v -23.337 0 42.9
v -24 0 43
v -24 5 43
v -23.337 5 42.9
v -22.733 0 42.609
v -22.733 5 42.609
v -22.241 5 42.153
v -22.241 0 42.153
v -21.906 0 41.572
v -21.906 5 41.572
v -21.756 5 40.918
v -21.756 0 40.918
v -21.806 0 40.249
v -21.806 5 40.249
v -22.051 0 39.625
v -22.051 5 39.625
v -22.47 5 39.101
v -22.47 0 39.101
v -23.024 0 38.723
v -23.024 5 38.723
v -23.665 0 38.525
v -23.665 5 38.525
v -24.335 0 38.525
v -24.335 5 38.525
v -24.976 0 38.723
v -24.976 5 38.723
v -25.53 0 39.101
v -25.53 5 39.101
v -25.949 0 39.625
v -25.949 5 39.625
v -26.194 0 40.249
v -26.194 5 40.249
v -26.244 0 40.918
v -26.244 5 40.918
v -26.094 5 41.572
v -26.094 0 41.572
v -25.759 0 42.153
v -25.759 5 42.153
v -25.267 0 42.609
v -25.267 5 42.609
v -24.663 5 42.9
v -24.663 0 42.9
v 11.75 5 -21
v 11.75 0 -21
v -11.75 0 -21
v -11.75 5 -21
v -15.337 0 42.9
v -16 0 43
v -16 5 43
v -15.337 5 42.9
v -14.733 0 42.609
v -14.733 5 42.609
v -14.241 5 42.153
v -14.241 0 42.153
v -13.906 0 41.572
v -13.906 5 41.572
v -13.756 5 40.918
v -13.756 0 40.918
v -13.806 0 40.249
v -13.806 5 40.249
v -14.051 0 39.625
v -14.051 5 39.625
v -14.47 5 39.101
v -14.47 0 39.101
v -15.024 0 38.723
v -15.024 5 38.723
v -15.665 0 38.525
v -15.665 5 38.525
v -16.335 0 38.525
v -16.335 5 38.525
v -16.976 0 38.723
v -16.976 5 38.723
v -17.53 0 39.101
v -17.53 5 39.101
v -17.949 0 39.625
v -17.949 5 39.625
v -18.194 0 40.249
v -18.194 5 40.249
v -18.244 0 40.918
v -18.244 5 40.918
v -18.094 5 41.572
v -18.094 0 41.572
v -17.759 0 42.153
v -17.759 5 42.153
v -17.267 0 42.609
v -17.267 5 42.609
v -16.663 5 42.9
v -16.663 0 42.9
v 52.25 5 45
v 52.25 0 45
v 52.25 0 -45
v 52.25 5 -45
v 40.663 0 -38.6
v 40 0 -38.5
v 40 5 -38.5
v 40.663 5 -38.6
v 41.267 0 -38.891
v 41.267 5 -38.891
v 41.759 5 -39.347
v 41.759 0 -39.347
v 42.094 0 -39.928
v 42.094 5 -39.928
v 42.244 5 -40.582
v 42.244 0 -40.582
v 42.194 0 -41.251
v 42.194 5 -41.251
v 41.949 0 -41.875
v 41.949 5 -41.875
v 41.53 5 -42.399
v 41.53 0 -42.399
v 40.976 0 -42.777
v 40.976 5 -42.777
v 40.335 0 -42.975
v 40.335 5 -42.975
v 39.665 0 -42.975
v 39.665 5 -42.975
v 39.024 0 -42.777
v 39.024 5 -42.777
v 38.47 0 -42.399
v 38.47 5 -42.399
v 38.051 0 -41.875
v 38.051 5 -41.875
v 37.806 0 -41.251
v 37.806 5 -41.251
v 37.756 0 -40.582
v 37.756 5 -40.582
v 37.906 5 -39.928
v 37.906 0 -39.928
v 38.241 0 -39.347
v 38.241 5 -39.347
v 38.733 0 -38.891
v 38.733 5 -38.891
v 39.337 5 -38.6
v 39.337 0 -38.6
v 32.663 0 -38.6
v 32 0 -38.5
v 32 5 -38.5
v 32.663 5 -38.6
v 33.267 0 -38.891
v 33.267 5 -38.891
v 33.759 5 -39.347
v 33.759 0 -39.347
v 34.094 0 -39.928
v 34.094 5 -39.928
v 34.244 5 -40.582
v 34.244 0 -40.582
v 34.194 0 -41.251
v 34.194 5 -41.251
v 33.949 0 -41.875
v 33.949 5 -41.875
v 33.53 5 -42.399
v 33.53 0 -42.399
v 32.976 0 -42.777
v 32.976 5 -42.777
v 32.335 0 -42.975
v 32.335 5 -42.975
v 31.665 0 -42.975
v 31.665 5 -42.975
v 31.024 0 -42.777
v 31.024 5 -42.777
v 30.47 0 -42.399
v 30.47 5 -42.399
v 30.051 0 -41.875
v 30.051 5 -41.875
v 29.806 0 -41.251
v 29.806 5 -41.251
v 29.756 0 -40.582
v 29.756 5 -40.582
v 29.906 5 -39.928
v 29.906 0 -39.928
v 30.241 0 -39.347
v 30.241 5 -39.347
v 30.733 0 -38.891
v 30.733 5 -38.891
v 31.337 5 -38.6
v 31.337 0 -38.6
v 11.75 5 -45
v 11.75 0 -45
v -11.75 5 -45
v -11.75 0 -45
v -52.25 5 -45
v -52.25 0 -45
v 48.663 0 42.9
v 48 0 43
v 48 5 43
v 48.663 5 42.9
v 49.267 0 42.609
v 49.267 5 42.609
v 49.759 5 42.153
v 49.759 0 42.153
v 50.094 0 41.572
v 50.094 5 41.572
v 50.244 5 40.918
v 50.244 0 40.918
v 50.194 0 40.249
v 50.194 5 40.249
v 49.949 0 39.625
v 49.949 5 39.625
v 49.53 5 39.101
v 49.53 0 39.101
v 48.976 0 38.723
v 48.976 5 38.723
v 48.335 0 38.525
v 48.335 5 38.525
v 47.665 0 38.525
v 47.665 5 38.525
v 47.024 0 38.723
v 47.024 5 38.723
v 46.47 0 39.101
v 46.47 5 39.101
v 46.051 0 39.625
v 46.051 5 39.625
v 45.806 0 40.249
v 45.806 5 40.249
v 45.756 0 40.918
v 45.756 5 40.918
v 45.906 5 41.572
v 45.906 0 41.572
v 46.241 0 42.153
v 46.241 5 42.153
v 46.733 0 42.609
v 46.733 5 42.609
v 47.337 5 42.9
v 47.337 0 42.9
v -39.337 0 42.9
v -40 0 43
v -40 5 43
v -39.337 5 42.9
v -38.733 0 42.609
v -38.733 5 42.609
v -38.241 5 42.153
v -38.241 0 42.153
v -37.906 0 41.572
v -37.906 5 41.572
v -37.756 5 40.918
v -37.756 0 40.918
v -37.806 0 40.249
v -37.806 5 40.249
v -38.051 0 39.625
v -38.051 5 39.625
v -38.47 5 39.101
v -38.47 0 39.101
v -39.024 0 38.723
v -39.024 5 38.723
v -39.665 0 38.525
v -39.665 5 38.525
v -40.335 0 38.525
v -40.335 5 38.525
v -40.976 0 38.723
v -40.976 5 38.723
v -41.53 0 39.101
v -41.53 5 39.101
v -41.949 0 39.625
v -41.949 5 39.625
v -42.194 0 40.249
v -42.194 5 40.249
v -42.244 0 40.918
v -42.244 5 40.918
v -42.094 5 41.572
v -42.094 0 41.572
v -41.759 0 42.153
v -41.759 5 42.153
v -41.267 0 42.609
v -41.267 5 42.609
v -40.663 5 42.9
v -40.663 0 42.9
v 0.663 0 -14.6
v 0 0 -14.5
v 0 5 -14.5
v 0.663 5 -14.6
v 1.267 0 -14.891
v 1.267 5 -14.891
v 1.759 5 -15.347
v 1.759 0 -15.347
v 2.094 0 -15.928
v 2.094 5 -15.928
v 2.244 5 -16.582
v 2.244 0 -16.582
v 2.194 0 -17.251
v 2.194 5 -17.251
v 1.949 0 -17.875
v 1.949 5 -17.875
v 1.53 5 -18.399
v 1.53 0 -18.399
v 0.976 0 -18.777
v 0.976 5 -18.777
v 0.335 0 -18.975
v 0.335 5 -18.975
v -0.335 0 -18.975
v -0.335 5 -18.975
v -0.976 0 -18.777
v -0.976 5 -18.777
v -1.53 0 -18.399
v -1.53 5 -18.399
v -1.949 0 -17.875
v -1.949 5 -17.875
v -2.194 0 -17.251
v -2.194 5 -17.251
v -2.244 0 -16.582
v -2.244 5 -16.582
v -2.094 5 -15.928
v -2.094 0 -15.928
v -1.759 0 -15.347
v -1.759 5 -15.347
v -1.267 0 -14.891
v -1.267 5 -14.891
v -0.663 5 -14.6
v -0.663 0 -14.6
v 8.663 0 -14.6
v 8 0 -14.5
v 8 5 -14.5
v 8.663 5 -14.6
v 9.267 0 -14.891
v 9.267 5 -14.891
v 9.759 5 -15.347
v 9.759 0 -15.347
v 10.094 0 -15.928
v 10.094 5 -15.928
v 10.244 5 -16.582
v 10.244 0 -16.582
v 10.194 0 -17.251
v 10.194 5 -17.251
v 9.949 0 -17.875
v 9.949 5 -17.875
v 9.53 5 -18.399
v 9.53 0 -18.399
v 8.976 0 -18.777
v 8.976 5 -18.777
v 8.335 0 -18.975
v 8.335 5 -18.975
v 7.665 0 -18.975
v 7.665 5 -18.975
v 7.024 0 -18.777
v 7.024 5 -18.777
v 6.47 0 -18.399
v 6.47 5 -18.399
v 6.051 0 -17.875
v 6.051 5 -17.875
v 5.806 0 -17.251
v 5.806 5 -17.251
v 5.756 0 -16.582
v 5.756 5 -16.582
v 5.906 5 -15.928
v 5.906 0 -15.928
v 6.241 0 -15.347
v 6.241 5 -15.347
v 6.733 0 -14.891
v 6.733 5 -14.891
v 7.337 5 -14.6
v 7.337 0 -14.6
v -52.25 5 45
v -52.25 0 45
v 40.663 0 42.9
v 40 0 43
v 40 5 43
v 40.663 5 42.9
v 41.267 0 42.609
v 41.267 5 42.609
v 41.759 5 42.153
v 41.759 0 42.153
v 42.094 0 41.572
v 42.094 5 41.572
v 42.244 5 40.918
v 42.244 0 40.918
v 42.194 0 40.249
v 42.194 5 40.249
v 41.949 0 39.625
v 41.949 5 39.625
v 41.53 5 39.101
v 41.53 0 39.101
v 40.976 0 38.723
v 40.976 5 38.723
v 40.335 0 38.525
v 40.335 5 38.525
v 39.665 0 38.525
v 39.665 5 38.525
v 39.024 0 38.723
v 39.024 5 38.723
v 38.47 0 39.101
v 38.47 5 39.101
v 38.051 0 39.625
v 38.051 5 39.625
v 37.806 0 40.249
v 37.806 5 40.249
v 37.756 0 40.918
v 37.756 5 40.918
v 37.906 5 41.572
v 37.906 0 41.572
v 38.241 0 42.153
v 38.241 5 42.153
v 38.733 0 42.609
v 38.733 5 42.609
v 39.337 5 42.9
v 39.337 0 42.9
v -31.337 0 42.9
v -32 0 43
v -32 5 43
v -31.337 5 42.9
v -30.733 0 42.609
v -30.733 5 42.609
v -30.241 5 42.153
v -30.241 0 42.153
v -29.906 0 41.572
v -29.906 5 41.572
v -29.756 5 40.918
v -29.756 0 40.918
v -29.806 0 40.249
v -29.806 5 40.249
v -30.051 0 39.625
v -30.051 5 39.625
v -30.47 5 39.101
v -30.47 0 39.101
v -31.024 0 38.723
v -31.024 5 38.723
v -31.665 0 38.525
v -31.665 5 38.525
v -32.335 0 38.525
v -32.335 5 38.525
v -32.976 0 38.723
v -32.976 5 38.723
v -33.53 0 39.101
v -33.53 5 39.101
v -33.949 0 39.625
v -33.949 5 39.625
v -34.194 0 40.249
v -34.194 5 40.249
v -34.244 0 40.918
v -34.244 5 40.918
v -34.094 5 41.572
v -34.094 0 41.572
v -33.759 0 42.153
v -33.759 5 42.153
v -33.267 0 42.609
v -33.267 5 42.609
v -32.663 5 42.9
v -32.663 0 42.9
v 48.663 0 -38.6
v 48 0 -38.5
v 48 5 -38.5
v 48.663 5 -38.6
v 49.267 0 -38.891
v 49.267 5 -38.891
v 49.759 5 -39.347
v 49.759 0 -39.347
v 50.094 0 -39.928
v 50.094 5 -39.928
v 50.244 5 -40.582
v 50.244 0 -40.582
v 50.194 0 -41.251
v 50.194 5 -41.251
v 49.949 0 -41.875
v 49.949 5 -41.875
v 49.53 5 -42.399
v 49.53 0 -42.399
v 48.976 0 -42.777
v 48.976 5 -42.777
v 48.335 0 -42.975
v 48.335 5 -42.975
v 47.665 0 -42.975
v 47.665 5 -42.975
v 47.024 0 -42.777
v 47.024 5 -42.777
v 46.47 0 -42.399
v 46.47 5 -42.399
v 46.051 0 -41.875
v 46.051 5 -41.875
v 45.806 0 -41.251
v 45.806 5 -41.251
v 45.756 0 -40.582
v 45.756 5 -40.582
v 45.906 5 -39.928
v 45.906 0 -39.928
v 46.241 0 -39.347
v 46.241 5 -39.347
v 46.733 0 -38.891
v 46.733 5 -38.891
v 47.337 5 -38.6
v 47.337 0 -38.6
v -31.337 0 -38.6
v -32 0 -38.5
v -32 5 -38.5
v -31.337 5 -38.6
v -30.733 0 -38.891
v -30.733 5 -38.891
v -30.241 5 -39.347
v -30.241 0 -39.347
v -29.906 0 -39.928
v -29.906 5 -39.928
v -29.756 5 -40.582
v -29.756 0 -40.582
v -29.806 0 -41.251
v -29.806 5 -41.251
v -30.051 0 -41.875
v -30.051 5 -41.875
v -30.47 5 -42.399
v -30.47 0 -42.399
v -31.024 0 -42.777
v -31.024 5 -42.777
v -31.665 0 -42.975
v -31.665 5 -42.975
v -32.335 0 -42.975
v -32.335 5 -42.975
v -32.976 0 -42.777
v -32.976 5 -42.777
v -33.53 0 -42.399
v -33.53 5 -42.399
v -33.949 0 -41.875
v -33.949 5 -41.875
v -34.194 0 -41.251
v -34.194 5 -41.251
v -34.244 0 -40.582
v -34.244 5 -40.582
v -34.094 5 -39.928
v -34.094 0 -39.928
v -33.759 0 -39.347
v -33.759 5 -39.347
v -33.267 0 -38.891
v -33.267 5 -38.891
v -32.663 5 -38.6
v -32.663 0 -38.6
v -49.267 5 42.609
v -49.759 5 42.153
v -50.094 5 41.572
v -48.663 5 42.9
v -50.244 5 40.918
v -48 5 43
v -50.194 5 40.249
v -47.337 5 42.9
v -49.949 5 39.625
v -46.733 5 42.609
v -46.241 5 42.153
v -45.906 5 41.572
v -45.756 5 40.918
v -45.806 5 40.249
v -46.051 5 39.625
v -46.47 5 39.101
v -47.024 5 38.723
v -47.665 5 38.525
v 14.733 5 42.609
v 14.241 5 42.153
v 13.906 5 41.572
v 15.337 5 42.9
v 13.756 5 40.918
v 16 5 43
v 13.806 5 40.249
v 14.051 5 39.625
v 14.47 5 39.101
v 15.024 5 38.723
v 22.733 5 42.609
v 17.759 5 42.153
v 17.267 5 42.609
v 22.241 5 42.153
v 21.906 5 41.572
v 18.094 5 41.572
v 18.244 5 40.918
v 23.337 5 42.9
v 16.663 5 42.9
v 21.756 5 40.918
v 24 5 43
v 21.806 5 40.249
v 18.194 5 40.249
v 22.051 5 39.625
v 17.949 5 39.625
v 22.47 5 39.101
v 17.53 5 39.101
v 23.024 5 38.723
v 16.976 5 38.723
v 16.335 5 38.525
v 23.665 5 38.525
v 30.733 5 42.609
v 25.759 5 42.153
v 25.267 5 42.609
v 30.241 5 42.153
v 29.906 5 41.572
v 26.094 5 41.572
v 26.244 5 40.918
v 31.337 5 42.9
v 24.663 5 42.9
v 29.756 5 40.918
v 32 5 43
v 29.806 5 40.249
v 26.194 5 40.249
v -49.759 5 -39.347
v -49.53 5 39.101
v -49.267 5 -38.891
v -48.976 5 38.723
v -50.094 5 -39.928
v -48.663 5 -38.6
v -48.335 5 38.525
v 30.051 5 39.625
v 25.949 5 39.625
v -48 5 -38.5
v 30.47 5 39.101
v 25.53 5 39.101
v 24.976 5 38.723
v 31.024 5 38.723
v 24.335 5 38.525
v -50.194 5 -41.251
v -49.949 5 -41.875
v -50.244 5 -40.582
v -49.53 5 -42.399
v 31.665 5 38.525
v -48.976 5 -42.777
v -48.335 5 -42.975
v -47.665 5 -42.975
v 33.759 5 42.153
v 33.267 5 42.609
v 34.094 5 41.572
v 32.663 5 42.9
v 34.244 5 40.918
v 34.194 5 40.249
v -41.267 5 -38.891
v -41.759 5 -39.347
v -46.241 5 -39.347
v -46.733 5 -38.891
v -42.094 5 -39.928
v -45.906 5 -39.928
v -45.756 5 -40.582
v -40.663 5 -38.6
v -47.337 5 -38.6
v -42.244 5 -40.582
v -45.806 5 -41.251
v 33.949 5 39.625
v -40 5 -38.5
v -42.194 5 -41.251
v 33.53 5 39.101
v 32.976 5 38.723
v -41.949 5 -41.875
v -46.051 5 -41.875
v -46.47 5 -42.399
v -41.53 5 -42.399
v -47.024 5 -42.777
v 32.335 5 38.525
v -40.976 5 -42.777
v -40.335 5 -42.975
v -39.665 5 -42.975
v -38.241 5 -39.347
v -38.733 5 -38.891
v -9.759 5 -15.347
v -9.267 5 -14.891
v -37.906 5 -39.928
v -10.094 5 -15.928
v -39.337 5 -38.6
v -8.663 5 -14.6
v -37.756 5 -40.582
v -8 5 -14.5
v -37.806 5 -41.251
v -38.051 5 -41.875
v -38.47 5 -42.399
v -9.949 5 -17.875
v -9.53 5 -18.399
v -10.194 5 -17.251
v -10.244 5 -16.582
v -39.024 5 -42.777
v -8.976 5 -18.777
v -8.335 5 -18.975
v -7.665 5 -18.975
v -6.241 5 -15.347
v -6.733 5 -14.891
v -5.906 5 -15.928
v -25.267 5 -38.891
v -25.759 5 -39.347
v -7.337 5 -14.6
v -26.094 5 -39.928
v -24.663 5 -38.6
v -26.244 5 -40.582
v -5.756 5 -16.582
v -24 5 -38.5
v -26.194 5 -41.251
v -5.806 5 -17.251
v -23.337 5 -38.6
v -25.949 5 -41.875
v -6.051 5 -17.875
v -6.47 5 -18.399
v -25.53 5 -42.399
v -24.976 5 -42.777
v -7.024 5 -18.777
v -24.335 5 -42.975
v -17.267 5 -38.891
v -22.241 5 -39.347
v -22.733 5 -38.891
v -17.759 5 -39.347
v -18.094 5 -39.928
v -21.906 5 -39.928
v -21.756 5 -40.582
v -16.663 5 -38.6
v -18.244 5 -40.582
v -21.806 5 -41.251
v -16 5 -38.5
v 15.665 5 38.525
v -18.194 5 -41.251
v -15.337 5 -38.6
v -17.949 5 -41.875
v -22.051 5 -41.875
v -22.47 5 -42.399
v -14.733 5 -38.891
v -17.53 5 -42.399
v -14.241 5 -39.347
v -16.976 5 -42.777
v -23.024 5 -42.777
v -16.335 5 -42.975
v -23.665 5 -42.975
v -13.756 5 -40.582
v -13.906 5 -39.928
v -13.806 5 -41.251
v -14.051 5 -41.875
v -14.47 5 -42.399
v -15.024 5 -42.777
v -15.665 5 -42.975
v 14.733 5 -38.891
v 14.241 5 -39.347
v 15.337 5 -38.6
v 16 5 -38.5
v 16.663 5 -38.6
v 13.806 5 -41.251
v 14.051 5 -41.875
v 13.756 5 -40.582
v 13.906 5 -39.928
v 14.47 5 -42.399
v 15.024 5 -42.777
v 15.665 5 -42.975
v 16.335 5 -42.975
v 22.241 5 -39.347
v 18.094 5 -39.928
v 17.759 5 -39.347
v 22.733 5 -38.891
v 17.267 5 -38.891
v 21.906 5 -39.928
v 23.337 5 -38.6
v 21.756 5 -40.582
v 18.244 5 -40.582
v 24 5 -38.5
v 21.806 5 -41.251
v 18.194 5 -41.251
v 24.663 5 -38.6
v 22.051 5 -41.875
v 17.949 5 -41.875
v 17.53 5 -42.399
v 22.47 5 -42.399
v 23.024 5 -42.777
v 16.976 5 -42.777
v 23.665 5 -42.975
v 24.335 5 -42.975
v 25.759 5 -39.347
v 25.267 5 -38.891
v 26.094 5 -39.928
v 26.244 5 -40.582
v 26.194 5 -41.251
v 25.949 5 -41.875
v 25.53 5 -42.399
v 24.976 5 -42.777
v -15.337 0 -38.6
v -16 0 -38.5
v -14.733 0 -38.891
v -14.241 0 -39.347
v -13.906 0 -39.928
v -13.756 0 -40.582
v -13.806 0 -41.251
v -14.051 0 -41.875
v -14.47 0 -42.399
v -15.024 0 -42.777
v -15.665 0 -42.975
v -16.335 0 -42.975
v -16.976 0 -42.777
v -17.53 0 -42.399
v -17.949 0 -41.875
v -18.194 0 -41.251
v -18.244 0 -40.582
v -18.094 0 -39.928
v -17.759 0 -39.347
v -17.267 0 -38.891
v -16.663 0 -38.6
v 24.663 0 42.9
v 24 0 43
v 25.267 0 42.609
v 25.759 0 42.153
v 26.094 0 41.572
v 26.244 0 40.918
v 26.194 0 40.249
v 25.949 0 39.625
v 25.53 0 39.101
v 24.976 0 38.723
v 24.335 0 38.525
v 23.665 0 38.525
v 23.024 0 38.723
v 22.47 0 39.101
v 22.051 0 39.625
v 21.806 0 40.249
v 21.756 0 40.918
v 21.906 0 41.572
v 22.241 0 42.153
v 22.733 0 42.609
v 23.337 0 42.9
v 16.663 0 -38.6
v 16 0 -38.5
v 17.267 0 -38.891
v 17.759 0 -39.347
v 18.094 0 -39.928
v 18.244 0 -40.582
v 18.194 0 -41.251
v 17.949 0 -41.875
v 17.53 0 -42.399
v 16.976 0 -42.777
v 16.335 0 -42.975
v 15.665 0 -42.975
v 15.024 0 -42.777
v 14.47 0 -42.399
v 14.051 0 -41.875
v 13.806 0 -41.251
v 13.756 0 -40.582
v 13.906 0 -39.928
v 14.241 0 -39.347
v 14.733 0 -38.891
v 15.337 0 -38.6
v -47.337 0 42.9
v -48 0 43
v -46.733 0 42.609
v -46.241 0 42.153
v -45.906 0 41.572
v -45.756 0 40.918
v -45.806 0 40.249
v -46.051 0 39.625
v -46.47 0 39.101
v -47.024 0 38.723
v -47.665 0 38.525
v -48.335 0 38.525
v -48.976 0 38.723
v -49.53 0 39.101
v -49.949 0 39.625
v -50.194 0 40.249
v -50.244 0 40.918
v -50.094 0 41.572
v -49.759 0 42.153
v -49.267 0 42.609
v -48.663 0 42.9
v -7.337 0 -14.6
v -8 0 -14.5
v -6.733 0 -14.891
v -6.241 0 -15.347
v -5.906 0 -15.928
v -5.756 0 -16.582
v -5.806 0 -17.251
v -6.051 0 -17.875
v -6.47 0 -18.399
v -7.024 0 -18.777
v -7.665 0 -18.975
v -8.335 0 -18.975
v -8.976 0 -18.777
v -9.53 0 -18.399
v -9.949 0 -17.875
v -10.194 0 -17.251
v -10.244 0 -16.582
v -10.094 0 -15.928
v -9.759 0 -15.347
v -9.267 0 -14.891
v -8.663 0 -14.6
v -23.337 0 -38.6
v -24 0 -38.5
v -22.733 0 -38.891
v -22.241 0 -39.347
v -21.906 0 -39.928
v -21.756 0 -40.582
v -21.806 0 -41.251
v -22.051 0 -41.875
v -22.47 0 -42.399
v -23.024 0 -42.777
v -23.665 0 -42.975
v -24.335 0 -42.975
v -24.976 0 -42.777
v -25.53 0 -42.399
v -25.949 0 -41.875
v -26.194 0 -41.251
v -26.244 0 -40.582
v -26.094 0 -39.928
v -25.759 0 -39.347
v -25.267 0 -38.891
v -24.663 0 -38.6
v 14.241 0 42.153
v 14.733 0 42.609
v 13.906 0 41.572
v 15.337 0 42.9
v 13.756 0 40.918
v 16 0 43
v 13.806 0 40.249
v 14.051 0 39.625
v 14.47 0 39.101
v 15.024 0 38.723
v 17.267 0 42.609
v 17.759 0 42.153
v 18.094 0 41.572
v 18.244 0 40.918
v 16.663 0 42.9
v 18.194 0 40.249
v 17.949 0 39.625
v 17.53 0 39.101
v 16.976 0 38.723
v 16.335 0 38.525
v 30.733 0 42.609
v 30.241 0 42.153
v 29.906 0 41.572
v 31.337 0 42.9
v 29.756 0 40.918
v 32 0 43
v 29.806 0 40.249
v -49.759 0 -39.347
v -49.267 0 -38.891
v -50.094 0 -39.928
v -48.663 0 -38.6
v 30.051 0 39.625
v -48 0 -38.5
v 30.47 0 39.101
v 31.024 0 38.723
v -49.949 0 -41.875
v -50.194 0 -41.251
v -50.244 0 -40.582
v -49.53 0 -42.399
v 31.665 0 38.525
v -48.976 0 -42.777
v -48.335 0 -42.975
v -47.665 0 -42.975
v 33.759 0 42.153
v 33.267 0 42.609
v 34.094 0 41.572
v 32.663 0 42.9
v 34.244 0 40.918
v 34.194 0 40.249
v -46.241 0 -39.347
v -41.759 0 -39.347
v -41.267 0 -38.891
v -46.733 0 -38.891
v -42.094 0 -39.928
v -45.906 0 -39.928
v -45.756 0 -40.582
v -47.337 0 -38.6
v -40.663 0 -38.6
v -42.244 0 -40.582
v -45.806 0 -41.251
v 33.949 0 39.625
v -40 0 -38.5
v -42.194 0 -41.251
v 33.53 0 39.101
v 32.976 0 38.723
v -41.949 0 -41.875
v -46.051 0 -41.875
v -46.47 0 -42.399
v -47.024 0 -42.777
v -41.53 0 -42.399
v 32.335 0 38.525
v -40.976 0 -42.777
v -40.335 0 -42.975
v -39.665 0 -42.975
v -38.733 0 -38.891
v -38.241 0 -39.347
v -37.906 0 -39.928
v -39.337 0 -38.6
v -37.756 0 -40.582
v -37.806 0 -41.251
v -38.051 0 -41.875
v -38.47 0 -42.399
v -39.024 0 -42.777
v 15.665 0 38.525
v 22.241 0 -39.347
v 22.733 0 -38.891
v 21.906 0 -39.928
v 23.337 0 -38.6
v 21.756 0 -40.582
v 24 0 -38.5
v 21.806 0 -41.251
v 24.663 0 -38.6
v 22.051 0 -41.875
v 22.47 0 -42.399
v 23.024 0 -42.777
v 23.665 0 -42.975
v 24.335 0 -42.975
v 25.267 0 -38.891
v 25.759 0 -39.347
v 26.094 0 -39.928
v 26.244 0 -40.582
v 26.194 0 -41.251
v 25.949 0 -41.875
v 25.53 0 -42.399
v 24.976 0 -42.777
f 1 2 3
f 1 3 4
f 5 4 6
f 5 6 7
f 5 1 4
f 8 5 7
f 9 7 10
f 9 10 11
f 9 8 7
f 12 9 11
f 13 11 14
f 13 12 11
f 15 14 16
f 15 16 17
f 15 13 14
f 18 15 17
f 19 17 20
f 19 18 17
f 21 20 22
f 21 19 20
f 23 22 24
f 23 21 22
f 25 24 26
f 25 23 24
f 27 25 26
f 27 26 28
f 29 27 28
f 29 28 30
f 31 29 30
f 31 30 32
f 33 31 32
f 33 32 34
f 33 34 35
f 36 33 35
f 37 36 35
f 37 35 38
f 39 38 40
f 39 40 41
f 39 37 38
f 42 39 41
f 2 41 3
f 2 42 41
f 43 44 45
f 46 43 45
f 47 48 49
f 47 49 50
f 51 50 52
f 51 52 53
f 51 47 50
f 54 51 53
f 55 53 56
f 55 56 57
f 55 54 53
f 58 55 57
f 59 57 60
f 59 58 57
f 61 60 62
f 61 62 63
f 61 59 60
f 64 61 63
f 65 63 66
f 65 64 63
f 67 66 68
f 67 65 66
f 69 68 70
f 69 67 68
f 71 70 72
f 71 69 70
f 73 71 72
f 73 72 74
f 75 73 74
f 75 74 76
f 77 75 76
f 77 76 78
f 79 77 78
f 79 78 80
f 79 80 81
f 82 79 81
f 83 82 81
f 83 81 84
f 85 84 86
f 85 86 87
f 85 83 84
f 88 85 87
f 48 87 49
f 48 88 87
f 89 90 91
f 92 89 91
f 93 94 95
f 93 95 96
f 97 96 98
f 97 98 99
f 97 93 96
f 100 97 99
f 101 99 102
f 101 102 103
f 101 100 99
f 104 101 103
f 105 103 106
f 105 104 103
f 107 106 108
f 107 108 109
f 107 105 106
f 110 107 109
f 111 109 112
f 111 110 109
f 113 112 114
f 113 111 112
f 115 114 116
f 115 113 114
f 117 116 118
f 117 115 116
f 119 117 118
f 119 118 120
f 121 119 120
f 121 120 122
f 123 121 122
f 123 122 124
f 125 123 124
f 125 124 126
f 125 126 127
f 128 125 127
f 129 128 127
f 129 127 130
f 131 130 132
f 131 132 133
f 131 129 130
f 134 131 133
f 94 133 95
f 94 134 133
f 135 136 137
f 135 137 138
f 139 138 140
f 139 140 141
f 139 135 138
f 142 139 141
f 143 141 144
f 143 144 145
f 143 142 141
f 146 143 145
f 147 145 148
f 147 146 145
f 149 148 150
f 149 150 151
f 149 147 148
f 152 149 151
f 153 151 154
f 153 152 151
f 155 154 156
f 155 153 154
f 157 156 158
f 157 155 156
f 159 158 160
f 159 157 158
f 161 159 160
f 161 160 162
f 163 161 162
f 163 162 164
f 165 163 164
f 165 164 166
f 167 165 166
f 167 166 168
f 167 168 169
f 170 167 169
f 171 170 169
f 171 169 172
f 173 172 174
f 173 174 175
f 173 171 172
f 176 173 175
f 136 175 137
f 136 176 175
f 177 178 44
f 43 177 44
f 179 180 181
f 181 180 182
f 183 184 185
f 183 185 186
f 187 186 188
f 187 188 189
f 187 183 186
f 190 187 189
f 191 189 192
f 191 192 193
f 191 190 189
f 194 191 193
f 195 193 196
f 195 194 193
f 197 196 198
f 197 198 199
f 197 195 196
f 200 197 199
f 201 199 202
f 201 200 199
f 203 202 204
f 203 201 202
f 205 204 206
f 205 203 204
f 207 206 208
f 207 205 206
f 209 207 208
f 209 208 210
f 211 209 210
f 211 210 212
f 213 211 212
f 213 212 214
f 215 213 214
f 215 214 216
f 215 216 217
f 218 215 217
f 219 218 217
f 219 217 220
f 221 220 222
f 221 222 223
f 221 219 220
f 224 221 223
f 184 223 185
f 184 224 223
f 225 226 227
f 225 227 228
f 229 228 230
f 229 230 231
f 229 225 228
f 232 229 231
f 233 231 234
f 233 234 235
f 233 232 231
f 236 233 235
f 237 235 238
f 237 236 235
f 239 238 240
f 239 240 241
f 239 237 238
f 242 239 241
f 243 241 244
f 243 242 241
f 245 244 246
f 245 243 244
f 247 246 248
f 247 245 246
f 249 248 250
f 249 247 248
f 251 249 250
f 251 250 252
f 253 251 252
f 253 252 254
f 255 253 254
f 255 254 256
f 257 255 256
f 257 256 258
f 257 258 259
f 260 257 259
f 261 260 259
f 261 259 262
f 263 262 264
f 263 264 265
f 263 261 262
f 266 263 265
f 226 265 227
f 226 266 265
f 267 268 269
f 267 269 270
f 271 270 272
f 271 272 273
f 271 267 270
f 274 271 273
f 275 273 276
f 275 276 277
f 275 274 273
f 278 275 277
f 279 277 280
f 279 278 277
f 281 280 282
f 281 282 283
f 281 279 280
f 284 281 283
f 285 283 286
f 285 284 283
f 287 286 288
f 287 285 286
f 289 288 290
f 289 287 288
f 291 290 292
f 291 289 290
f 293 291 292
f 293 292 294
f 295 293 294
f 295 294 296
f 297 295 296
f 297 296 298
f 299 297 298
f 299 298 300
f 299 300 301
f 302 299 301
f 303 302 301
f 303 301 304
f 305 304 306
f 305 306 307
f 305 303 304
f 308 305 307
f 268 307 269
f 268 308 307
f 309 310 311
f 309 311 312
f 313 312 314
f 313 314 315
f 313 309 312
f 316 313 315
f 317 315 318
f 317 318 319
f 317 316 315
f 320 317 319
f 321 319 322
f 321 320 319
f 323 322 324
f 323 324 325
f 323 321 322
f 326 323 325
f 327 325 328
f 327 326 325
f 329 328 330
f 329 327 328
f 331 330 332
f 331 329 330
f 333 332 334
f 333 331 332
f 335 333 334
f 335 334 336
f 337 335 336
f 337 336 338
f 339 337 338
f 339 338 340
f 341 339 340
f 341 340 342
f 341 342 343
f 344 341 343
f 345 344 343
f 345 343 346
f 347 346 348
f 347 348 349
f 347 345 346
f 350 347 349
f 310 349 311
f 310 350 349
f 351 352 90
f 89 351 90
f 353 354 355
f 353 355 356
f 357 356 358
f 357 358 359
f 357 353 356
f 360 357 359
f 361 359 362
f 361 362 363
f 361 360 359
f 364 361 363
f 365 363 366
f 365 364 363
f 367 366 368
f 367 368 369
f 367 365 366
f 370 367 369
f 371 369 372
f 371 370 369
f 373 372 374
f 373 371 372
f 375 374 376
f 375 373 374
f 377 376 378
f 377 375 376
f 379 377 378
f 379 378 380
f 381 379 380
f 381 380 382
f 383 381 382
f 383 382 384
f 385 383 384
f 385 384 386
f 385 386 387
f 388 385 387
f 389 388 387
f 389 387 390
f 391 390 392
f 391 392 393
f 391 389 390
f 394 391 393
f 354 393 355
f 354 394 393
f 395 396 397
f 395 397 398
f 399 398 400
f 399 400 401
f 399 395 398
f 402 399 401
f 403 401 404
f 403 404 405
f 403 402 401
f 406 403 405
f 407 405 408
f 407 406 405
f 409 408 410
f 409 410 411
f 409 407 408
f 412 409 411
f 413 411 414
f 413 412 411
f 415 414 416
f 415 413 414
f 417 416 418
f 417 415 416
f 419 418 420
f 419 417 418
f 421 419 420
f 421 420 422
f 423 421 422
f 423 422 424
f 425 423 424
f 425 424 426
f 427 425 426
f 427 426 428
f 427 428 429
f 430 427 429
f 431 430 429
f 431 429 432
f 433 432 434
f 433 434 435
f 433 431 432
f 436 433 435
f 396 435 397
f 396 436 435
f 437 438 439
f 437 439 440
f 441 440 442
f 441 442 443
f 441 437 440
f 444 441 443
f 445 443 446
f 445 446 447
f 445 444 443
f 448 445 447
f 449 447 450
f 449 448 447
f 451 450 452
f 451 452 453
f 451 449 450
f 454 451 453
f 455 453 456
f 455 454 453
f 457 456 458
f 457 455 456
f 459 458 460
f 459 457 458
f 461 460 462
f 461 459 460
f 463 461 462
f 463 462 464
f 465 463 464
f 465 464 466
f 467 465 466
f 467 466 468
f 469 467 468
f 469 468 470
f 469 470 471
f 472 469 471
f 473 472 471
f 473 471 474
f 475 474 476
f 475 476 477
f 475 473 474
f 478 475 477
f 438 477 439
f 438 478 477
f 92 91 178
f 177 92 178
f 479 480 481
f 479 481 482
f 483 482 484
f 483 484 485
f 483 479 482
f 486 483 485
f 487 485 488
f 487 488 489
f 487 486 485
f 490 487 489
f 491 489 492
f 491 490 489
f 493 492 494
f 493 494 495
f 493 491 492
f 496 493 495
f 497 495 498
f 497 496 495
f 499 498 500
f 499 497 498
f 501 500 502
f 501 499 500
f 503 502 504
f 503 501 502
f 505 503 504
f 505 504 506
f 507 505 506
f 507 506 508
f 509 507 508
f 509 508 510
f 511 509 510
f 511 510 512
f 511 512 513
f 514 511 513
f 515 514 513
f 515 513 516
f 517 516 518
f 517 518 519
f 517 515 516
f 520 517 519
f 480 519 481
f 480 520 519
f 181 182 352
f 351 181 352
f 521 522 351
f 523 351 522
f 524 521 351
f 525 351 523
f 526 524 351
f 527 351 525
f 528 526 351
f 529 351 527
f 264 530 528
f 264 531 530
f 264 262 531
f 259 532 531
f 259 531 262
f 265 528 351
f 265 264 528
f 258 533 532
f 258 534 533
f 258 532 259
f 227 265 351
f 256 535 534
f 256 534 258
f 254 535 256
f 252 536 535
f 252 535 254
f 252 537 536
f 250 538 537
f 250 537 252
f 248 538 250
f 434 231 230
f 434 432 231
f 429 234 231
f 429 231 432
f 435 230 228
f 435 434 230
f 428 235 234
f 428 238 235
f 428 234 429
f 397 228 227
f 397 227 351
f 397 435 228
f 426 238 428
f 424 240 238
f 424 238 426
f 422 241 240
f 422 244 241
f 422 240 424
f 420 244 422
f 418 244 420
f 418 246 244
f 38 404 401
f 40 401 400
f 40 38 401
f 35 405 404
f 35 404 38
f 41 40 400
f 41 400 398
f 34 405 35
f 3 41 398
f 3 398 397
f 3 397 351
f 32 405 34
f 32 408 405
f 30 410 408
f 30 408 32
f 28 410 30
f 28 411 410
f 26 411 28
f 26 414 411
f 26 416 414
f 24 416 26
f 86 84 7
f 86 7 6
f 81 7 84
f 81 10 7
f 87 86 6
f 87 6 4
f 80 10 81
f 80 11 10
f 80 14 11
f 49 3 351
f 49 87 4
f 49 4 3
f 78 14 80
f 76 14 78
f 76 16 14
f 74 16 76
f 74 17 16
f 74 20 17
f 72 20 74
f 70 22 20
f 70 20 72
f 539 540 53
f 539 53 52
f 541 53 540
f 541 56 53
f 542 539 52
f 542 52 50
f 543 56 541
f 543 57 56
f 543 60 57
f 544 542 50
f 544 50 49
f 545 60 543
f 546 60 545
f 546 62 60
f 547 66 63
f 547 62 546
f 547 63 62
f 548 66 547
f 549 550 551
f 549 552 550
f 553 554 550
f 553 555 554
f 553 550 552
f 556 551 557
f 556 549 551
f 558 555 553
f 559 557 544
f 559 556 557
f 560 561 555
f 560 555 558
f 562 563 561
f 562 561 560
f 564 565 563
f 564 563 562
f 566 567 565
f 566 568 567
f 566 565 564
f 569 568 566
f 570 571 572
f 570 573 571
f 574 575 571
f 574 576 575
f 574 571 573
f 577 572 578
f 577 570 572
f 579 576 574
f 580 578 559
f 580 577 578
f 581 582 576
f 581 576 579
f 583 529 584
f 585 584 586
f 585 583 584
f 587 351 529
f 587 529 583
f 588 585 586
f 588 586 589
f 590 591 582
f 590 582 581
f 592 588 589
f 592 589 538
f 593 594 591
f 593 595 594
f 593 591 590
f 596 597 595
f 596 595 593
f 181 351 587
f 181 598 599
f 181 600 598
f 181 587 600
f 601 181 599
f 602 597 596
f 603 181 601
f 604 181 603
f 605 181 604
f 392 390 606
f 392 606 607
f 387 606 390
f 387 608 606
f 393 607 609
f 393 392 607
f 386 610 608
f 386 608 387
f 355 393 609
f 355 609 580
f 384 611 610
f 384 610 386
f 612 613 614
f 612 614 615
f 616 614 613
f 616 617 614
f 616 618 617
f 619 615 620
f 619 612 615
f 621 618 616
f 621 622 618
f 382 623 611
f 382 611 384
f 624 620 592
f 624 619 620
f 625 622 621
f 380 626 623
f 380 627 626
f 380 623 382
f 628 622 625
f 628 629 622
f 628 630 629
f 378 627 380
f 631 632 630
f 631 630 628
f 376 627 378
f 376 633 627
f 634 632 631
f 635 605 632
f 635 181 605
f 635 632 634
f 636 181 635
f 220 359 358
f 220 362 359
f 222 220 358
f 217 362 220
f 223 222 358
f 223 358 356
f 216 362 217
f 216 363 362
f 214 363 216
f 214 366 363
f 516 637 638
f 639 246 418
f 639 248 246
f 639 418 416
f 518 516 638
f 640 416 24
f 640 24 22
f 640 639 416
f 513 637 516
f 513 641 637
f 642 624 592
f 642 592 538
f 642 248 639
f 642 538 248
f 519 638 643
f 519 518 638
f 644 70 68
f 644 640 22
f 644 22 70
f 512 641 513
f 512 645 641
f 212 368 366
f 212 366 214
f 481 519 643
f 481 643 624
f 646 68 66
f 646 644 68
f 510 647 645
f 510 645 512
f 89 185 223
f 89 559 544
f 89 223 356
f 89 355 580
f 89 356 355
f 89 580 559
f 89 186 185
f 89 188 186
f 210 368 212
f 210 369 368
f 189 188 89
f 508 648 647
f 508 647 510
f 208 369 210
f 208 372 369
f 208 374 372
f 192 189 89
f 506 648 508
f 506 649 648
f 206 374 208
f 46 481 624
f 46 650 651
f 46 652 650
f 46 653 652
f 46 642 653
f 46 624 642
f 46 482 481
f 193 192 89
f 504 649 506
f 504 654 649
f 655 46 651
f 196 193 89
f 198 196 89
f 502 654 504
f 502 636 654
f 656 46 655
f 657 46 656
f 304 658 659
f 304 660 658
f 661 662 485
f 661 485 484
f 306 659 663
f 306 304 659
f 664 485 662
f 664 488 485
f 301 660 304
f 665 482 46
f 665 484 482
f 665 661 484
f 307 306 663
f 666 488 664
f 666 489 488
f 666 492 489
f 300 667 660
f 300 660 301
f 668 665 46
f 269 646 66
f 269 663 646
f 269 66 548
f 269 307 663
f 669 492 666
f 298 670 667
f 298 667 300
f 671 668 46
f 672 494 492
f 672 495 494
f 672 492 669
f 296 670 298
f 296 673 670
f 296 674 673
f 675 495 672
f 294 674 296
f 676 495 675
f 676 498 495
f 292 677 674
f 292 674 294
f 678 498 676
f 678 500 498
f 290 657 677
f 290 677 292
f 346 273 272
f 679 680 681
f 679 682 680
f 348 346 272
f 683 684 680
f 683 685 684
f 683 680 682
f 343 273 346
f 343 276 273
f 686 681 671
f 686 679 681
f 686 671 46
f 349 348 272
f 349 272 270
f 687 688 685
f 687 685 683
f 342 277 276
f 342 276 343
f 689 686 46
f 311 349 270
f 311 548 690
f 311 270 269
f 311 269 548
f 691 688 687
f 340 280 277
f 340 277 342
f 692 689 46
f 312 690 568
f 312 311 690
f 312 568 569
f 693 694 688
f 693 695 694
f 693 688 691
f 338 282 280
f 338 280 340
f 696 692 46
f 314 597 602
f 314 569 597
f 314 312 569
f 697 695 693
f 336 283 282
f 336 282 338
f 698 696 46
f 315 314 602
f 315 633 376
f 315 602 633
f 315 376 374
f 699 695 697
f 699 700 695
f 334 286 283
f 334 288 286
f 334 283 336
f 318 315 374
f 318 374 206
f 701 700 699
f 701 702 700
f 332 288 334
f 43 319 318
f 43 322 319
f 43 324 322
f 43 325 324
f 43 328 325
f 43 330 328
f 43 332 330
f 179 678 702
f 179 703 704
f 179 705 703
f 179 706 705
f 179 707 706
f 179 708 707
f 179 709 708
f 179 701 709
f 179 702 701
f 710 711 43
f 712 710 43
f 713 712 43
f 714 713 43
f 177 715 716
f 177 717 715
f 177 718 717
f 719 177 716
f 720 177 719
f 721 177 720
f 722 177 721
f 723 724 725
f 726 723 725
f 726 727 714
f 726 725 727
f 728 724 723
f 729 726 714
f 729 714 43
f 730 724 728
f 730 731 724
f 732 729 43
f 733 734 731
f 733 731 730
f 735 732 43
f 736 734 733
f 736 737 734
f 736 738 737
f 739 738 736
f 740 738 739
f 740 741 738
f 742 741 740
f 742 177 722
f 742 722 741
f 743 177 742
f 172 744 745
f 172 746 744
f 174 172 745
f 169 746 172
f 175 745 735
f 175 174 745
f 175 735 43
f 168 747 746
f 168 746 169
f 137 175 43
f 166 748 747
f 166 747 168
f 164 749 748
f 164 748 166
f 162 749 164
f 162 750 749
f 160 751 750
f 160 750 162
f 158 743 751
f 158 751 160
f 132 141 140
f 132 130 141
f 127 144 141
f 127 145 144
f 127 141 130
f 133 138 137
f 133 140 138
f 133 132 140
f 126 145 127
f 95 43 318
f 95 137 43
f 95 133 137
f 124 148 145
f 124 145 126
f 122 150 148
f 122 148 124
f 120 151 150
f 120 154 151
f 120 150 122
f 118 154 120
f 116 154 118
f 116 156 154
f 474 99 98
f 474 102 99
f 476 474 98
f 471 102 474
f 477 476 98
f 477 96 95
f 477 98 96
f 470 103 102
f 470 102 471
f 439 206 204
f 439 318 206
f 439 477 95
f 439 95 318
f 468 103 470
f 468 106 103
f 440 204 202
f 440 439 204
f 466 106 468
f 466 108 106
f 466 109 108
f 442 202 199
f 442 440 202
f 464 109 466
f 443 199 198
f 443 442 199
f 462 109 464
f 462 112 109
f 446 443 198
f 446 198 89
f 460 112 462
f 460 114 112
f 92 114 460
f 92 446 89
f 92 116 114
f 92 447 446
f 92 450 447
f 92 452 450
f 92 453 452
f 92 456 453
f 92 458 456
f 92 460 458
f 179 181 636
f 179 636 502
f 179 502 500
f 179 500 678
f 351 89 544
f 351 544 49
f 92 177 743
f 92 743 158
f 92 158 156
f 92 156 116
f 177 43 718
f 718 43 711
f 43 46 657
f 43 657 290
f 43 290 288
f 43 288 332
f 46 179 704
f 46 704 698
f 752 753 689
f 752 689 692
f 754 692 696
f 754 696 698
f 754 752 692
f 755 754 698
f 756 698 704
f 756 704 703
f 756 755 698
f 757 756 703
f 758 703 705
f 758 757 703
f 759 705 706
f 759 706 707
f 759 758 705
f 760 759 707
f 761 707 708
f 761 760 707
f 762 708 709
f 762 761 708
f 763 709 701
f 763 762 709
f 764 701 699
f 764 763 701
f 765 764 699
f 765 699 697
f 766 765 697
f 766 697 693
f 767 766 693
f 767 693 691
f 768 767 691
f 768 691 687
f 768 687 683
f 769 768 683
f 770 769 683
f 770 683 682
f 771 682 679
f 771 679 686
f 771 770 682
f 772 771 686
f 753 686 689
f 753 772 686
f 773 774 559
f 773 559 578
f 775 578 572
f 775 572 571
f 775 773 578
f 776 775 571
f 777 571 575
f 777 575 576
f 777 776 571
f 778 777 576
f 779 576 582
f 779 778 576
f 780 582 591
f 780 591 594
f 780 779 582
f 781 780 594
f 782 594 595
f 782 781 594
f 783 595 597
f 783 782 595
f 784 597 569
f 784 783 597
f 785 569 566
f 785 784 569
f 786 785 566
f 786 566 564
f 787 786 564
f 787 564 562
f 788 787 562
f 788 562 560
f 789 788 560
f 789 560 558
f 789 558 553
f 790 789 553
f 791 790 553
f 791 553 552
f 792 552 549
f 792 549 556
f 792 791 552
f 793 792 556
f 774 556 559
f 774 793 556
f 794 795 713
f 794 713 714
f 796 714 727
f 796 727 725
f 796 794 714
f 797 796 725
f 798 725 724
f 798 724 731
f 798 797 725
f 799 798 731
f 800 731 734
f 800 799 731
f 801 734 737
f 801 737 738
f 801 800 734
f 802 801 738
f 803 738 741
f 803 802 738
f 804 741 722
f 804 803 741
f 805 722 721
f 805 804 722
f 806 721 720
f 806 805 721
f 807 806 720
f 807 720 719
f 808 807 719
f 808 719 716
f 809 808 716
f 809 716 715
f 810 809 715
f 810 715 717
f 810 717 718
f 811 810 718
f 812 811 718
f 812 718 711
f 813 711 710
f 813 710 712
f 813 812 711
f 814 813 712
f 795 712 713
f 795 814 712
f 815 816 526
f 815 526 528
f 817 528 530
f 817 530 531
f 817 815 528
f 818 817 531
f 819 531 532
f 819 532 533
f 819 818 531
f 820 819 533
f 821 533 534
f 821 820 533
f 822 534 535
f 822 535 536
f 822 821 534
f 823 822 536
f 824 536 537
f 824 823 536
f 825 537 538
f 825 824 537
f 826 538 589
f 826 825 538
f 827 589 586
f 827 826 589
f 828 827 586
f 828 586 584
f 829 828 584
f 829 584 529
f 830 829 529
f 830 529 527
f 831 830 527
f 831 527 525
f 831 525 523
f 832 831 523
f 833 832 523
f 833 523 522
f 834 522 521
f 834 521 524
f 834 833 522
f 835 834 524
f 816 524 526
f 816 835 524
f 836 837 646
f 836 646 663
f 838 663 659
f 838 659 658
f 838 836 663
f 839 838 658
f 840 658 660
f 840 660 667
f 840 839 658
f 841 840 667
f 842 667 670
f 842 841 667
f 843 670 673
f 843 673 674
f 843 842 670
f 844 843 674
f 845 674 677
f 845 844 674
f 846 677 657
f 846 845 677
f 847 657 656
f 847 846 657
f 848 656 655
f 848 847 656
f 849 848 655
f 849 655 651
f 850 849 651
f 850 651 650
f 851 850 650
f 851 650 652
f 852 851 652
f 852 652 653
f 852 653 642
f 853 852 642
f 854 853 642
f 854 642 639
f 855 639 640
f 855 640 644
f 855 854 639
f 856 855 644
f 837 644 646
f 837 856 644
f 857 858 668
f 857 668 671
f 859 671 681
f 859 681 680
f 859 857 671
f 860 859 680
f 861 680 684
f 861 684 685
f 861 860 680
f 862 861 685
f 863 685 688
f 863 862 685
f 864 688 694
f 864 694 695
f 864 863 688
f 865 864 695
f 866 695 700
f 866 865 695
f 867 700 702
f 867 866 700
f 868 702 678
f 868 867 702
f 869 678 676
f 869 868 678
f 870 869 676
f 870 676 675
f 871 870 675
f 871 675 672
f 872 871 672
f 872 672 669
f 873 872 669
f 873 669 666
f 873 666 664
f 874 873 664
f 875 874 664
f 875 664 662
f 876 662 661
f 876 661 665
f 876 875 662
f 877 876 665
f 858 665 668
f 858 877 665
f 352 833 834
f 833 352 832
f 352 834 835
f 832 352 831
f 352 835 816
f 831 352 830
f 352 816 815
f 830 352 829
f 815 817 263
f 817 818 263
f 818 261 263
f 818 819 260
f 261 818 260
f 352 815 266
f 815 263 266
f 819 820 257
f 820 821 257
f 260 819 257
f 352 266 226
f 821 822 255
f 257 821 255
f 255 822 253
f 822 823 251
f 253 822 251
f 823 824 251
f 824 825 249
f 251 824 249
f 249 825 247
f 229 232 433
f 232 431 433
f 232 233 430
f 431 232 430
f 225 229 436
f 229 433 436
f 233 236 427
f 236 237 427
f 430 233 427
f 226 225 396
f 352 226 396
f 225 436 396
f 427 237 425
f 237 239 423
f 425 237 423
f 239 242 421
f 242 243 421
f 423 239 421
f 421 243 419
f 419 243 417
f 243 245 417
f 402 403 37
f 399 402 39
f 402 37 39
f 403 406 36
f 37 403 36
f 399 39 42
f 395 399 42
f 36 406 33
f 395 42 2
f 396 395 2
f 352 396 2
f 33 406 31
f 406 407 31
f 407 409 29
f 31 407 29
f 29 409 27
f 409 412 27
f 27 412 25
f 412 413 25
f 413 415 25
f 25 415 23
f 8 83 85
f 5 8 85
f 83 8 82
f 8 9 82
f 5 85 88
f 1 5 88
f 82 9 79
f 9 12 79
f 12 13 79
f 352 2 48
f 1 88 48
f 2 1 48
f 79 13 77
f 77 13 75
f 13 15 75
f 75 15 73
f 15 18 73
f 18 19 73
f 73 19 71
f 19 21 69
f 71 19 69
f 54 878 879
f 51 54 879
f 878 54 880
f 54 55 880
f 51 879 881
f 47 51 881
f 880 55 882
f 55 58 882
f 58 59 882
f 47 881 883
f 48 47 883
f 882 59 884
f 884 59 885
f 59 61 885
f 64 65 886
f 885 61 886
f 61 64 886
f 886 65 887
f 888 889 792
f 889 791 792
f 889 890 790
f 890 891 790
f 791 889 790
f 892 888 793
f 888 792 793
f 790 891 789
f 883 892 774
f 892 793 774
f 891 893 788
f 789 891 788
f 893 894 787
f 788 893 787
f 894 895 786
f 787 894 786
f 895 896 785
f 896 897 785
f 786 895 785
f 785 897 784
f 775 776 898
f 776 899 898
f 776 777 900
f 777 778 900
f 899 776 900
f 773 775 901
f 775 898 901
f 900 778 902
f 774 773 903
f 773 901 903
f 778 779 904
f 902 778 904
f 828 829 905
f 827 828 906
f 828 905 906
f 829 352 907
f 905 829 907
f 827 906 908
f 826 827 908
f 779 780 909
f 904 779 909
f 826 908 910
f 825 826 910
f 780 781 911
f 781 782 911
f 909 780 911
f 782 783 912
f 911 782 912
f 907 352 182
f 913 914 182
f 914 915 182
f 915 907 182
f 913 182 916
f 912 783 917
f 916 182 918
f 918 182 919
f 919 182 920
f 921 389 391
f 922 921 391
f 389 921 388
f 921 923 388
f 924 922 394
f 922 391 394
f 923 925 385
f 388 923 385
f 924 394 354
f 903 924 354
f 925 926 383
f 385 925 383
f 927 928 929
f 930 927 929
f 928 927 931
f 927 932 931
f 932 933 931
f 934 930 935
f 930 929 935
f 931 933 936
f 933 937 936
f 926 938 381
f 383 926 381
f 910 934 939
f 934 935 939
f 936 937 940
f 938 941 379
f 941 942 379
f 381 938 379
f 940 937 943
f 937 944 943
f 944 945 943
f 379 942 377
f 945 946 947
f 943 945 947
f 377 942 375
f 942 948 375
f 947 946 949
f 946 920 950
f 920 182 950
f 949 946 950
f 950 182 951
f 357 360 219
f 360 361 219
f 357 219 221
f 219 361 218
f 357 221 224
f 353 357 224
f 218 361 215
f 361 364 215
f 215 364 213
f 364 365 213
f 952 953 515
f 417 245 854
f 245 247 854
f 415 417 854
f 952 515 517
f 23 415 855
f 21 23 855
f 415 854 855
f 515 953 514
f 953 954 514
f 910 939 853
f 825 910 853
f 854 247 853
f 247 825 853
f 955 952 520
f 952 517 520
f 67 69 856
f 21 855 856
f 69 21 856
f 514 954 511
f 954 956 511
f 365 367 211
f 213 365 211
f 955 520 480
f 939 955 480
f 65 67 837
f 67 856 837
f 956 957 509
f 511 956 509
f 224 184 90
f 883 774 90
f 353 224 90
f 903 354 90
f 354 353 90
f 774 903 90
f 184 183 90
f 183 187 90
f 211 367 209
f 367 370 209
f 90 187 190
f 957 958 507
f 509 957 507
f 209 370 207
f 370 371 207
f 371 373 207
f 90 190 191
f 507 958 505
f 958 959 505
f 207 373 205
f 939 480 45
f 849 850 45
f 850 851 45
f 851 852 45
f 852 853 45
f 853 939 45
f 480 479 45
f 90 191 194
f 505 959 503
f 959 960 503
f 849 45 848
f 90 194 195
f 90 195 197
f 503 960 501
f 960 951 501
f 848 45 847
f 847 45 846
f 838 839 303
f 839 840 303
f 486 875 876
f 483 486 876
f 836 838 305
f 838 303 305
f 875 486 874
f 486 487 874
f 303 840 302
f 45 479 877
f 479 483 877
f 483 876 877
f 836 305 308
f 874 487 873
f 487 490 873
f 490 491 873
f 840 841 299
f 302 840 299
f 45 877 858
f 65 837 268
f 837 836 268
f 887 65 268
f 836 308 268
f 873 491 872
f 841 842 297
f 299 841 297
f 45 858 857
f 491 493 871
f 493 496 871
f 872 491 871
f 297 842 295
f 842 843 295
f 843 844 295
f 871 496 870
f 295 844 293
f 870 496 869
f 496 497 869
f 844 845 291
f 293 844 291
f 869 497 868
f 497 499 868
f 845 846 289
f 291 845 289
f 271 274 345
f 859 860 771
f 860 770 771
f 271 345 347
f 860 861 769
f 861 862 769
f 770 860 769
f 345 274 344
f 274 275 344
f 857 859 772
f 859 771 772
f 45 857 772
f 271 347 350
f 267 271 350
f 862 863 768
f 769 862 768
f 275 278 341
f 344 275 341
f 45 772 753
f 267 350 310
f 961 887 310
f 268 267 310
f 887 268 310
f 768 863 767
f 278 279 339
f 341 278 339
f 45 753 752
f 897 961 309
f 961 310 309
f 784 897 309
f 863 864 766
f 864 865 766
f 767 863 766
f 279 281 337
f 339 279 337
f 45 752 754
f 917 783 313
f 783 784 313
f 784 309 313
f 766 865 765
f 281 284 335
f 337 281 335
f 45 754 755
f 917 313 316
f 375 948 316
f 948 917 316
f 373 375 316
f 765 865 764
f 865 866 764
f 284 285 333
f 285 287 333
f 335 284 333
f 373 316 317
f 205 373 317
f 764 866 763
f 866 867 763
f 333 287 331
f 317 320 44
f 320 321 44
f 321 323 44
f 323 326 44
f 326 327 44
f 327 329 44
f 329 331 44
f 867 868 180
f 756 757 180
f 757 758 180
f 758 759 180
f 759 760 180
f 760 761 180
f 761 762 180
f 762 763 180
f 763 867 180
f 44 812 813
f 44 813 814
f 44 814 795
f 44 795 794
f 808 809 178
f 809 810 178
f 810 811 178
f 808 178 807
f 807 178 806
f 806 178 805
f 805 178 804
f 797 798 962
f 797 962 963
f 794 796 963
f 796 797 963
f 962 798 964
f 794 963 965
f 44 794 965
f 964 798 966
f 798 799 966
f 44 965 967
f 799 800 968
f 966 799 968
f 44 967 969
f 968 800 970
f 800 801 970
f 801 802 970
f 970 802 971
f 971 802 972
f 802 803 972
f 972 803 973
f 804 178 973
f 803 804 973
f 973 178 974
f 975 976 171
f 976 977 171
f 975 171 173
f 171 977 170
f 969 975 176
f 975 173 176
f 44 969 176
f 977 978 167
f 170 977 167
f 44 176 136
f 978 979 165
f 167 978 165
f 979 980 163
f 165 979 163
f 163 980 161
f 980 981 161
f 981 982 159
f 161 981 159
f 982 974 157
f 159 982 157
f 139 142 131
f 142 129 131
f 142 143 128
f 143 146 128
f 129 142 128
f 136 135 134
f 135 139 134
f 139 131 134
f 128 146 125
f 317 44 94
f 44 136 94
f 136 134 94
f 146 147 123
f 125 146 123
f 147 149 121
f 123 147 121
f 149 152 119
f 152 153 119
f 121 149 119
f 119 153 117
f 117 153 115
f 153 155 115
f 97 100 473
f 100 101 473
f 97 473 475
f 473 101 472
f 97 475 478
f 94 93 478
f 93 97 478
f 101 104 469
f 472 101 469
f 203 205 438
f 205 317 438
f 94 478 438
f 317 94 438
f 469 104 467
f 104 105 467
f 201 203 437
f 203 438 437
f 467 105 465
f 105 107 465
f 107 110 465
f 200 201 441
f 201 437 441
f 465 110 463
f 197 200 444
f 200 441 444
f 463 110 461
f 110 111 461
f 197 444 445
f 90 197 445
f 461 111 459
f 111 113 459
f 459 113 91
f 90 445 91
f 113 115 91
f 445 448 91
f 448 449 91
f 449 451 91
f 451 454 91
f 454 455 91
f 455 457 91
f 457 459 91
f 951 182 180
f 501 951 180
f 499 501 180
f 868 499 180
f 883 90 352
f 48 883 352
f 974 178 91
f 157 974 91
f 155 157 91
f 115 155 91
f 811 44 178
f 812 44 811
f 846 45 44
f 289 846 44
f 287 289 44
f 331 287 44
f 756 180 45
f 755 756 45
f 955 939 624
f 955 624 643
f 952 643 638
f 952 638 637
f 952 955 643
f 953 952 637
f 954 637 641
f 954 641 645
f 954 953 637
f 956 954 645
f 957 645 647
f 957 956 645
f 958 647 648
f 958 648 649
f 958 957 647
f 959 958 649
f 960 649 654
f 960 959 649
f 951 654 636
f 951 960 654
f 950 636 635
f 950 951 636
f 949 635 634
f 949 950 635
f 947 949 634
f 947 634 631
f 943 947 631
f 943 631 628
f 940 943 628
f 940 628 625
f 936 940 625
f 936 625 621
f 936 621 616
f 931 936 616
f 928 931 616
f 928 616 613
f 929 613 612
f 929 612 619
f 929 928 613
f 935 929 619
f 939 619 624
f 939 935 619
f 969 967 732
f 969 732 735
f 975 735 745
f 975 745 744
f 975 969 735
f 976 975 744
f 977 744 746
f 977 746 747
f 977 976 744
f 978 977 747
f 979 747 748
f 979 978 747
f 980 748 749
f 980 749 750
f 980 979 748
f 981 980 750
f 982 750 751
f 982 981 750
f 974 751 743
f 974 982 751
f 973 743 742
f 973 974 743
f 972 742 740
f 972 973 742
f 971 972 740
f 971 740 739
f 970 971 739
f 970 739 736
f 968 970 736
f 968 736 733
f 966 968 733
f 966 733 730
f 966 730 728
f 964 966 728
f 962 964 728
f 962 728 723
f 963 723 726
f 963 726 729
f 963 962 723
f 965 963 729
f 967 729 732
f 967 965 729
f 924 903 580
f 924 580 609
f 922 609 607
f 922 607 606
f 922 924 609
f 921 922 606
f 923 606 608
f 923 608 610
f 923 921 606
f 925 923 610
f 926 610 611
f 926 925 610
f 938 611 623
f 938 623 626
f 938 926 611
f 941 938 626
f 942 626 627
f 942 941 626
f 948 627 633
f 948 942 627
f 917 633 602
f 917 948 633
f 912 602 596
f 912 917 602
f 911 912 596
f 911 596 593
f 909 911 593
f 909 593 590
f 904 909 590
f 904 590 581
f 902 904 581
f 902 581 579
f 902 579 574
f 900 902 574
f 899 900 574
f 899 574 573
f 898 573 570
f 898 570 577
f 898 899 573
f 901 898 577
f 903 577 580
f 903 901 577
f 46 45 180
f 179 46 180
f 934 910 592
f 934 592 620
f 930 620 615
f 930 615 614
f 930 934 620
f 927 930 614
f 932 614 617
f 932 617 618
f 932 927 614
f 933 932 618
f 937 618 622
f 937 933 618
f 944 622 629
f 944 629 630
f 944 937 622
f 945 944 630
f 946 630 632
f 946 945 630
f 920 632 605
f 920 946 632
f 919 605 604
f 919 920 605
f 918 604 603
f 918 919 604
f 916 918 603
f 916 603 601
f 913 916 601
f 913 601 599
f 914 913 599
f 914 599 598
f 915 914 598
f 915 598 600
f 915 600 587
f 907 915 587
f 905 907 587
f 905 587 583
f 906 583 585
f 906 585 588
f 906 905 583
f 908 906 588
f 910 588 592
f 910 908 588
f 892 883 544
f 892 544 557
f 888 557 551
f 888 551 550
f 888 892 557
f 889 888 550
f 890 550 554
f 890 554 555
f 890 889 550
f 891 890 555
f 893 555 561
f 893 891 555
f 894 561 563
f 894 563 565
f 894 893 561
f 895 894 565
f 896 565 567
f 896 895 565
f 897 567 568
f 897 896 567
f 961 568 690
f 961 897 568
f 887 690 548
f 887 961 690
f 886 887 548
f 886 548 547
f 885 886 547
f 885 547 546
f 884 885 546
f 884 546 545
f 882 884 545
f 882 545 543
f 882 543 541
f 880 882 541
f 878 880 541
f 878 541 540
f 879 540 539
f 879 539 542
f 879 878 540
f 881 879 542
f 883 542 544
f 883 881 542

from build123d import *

# Parameters (mm, degrees)
SKETCH_2_R      = 2.25
EXTRUDE_1_DEPTH = 5


with BuildPart() as part:
    # 草图2 → 凸台-拉伸1 (new body)
    with BuildSketch(Plane(origin=(0, 0, 0), x_dir=(1, 0, 0), z_dir=(0, 1, 0))):
        Polygon((-11.75, 45), (-52.25, 45), (-52.25, -45), (52.25, -45), (52.25, 45), (11.75, 45), (11.75, 21), (-11.75, 21), align=None)
        with Locations(Location((-48, -40.75, 0), (0, 0, 270))):
            Circle(SKETCH_2_R, mode=Mode.SUBTRACT)
        with Locations(Location((-40, -40.75, 0), (0, 0, 270))):
            Circle(SKETCH_2_R, mode=Mode.SUBTRACT)
        with Locations(Location((-32, -40.75, 0), (0, 0, 270))):
            Circle(SKETCH_2_R, mode=Mode.SUBTRACT)
        with Locations(Location((-24, -40.75, 0), (0, 0, 270))):
            Circle(SKETCH_2_R, mode=Mode.SUBTRACT)
        with Locations(Location((-16, -40.75, 0), (0, 0, 270))):
            Circle(SKETCH_2_R, mode=Mode.SUBTRACT)
        with Locations(Location((16, -40.75, 0), (0, 0, 270))):
            Circle(SKETCH_2_R, mode=Mode.SUBTRACT)
        with Locations(Location((24, -40.75, 0), (0, 0, 270))):
            Circle(SKETCH_2_R, mode=Mode.SUBTRACT)
        with Locations(Location((32, -40.75, 0), (0, 0, 270))):
            Circle(SKETCH_2_R, mode=Mode.SUBTRACT)
        with Locations(Location((40, -40.75, 0), (0, 0, 270))):
            Circle(SKETCH_2_R, mode=Mode.SUBTRACT)
        with Locations(Location((48, -40.75, 0), (0, 0, 270))):
            Circle(SKETCH_2_R, mode=Mode.SUBTRACT)
        with Locations(Location((-8, 16.75, 0), (0, 0, 270))):
            Circle(SKETCH_2_R, mode=Mode.SUBTRACT)
        with Locations(Location((-48, 40.75, 0), (0, 0, 270))):
            Circle(SKETCH_2_R, mode=Mode.SUBTRACT)
        with Locations(Location((-40, 40.75, 0), (0, 0, 270))):
            Circle(SKETCH_2_R, mode=Mode.SUBTRACT)
        with Locations(Location((-32, 40.75, 0), (0, 0, 270))):
            Circle(SKETCH_2_R, mode=Mode.SUBTRACT)
        with Locations(Location((-24, 40.75, 0), (0, 0, 270))):
            Circle(SKETCH_2_R, mode=Mode.SUBTRACT)
        with Locations(Location((-16, 40.75, 0), (0, 0, 270))):
            Circle(SKETCH_2_R, mode=Mode.SUBTRACT)
        with Locations(Location((0, 16.75, 0), (0, 0, 270))):
            Circle(SKETCH_2_R, mode=Mode.SUBTRACT)
        with Locations(Location((8, 16.75, 0), (0, 0, 270))):
            Circle(SKETCH_2_R, mode=Mode.SUBTRACT)
        with Locations(Location((16, 40.75, 0), (0, 0, 270))):
            Circle(SKETCH_2_R, mode=Mode.SUBTRACT)
        with Locations(Location((24, 40.75, 0), (0, 0, 270))):
            Circle(SKETCH_2_R, mode=Mode.SUBTRACT)
        with Locations(Location((32, 40.75, 0), (0, 0, 270))):
            Circle(SKETCH_2_R, mode=Mode.SUBTRACT)
        with Locations(Location((40, 40.75, 0), (0, 0, 270))):
            Circle(SKETCH_2_R, mode=Mode.SUBTRACT)
        with Locations(Location((48, 40.75, 0), (0, 0, 270))):
            Circle(SKETCH_2_R, mode=Mode.SUBTRACT)
    extrude(amount=EXTRUDE_1_DEPTH)


solid = part.part
